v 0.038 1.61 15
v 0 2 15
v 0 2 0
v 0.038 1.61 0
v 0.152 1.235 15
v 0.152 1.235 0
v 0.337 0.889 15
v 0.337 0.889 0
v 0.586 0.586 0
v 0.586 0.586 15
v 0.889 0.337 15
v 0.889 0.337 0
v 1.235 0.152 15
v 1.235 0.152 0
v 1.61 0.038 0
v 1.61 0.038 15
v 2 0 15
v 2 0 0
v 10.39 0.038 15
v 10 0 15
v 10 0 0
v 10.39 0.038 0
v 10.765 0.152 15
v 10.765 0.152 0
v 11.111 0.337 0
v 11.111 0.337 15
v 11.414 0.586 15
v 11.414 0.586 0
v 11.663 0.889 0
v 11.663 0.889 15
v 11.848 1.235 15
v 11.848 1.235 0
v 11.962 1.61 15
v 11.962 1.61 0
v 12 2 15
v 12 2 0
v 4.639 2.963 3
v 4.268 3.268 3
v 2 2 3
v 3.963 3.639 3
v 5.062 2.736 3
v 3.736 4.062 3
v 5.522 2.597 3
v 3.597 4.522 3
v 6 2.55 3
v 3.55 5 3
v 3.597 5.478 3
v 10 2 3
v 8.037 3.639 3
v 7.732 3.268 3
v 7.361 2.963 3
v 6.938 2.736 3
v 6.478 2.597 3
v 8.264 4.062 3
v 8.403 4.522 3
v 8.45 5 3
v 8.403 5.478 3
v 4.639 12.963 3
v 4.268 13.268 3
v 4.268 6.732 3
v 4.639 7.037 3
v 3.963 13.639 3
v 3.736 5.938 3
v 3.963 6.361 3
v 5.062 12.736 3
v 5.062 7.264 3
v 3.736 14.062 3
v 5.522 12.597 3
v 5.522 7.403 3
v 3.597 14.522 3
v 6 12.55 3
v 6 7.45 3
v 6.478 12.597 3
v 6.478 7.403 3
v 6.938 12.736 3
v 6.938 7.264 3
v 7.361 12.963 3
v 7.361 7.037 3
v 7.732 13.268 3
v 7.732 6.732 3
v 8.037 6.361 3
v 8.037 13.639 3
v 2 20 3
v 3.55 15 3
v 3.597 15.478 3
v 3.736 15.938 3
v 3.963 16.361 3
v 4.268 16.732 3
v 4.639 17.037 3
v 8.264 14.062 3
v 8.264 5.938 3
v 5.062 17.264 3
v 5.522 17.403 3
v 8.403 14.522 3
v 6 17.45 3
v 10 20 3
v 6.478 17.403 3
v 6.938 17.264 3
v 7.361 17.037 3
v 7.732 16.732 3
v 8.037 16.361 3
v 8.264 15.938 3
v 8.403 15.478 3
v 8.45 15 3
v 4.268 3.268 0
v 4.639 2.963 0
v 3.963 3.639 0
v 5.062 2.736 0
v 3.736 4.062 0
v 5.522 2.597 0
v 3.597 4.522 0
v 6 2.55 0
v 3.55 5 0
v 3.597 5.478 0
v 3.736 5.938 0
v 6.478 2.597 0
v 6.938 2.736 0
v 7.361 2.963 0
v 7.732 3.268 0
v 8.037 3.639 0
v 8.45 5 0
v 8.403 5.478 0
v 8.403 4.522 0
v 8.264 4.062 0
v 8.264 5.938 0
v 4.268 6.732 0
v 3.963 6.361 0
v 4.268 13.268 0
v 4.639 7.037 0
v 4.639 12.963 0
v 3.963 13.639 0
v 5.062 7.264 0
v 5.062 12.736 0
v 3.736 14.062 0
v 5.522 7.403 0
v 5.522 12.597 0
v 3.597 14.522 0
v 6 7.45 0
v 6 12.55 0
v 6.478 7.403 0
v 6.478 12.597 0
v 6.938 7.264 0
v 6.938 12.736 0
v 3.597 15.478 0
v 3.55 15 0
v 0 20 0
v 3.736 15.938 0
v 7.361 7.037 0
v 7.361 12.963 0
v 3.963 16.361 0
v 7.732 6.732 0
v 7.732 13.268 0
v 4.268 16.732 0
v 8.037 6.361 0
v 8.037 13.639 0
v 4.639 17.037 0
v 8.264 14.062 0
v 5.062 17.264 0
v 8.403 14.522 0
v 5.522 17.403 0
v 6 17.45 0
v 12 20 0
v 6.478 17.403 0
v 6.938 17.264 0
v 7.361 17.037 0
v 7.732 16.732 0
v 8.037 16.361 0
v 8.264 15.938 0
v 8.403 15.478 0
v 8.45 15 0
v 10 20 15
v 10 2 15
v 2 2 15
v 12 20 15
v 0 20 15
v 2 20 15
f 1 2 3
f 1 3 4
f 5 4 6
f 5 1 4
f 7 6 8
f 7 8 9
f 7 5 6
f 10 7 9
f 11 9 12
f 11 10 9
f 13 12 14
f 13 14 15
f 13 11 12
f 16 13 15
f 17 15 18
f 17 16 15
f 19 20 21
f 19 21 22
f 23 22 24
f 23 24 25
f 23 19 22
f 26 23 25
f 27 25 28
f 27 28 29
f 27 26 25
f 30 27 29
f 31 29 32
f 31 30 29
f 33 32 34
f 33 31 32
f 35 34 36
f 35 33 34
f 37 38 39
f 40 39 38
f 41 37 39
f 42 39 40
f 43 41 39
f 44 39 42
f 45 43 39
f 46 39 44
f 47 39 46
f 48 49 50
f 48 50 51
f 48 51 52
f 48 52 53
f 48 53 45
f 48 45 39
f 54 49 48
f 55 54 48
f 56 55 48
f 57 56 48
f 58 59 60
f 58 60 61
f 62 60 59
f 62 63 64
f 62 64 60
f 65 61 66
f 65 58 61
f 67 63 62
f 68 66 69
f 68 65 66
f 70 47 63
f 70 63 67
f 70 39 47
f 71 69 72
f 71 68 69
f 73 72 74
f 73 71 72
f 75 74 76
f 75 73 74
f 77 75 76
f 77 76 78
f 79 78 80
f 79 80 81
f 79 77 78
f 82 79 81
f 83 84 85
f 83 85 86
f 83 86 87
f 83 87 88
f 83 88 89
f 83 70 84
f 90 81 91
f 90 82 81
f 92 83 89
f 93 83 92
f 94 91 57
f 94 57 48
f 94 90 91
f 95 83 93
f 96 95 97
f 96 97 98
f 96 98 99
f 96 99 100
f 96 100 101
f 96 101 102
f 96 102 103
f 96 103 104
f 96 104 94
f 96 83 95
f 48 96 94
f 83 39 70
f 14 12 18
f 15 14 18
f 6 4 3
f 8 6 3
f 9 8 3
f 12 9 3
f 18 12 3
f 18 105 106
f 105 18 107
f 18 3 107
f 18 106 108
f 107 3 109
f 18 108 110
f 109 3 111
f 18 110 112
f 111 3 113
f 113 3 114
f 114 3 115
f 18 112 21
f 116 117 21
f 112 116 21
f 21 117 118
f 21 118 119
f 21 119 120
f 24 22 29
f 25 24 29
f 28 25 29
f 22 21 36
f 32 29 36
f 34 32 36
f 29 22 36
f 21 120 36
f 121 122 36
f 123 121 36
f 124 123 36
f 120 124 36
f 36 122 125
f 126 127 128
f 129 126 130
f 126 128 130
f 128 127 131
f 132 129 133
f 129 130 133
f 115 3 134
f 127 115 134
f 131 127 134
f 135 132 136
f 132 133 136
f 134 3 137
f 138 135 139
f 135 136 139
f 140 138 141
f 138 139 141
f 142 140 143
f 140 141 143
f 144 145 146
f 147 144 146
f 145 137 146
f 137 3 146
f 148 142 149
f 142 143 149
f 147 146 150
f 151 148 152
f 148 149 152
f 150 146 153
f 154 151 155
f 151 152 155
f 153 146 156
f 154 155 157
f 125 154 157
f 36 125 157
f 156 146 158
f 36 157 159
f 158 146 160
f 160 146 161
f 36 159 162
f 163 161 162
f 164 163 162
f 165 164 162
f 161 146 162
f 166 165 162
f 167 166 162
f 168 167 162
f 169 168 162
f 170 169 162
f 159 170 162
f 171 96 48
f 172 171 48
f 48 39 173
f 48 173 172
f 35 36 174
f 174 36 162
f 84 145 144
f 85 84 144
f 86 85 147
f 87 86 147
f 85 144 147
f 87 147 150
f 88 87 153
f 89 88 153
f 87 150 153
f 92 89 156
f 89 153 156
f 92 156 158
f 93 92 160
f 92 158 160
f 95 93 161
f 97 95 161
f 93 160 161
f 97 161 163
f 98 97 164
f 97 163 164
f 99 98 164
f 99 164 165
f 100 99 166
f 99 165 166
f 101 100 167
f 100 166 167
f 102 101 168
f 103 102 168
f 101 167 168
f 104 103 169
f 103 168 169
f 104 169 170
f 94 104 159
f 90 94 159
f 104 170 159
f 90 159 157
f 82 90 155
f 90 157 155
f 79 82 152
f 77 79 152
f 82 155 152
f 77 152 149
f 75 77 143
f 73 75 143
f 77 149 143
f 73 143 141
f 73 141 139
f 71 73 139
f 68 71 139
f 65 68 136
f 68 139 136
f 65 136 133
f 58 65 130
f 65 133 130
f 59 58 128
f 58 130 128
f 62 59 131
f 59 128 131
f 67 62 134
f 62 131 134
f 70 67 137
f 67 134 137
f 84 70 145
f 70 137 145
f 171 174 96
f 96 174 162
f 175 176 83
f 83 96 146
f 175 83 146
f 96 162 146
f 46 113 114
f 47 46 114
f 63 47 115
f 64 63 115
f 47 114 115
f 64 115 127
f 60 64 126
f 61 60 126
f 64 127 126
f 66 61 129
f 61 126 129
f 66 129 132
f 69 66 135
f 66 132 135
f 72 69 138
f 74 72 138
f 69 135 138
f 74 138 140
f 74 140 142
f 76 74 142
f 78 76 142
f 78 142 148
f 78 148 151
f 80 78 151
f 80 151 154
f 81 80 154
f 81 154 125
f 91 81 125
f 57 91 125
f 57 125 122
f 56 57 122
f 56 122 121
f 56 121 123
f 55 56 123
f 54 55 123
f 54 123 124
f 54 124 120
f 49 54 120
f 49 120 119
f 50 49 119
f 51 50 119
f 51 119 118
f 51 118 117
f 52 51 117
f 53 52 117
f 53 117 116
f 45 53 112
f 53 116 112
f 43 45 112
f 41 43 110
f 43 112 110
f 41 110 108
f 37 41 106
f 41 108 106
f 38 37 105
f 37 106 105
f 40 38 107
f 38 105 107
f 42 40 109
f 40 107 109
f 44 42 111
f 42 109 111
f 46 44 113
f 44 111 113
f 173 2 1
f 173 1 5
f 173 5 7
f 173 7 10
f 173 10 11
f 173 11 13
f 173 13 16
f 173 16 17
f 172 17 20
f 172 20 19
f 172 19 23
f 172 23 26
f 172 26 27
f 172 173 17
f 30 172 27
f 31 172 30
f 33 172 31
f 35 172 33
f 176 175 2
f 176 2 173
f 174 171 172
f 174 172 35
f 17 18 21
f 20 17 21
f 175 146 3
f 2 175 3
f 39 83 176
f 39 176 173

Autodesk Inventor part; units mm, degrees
ref_plane "YZ Plane" through (0, 0, 0) normal (1, 0, 0) x (0, 1, 0)
ref_plane "XZ Plane" through (0, 0, 0) normal (0, 1, 0) x (-1, 0, 0)
ref_plane "XY Plane" through (0, 0, 0) normal (0, 0, 1) x (1, 0, 0)
sketch "스케치1" plane through (0, 0, 0) normal (0, 0, 1) x (1, 0, 0)
  line L0 (0, 0) -> (12, 0)
  line L1 (12, 0) -> (12, 20)
  line L2 (12, 20) -> (0, 20)
  line L3 (0, 20) -> (0, 0)
  dimension "d0" = 12
  dimension "d1" = 20
extrude "돌출1" add sketch "스케치1" along normal blind 3
sketch "스케치2" plane through (0, 0, 3) normal (0, 0, 1) x (1, 0, 0)
  line L0 (0, 20) -> (0, 0) projected
  line L1 (0, 0) -> (12, 0) projected
  line L2 (12, 0) -> (12, 20) projected
  line L3 (12, 20) -> (0, 20) projected
  line L4 (2, 20) -> (2, 0)
  line L5 (10, 20) -> (10, 0)
  line L6 (2, 2) -> (10, 2)
  dimension "d4" = 2
  dimension "d5" = 2
  dimension "d6" = 2
extrude "돌출2" add sketch "스케치2" along normal blind 12 contours L3 L4 L1 L0 | L4 L6 L5 L1 | L3 L2 L1 L5
sketch "스케치3" plane through (0, 0, 0) normal (0, 0, -1) x (-1, 0, 0)
  line L0 (0, 0) -> (-12, 0) projected
  circle A0 centre (-6, 5) radius 2.45
  circle A1 centre (-6, 15) radius 2.45
  point P0 (-6, 0)
  point P1 (-6, 0)
  dimension "d9" = 5
  dimension "d10" = 10
  dimension "d11" = 4.9
  dimension "d12" = 4.9
extrude "돌출3" cut sketch "스케치3" against normal blind 3
fillet "모깎기1" radius 2 2 edges at (12, 0, 7.5) (0, 0, 7.5)
properties part number "_3D 인쇄"
